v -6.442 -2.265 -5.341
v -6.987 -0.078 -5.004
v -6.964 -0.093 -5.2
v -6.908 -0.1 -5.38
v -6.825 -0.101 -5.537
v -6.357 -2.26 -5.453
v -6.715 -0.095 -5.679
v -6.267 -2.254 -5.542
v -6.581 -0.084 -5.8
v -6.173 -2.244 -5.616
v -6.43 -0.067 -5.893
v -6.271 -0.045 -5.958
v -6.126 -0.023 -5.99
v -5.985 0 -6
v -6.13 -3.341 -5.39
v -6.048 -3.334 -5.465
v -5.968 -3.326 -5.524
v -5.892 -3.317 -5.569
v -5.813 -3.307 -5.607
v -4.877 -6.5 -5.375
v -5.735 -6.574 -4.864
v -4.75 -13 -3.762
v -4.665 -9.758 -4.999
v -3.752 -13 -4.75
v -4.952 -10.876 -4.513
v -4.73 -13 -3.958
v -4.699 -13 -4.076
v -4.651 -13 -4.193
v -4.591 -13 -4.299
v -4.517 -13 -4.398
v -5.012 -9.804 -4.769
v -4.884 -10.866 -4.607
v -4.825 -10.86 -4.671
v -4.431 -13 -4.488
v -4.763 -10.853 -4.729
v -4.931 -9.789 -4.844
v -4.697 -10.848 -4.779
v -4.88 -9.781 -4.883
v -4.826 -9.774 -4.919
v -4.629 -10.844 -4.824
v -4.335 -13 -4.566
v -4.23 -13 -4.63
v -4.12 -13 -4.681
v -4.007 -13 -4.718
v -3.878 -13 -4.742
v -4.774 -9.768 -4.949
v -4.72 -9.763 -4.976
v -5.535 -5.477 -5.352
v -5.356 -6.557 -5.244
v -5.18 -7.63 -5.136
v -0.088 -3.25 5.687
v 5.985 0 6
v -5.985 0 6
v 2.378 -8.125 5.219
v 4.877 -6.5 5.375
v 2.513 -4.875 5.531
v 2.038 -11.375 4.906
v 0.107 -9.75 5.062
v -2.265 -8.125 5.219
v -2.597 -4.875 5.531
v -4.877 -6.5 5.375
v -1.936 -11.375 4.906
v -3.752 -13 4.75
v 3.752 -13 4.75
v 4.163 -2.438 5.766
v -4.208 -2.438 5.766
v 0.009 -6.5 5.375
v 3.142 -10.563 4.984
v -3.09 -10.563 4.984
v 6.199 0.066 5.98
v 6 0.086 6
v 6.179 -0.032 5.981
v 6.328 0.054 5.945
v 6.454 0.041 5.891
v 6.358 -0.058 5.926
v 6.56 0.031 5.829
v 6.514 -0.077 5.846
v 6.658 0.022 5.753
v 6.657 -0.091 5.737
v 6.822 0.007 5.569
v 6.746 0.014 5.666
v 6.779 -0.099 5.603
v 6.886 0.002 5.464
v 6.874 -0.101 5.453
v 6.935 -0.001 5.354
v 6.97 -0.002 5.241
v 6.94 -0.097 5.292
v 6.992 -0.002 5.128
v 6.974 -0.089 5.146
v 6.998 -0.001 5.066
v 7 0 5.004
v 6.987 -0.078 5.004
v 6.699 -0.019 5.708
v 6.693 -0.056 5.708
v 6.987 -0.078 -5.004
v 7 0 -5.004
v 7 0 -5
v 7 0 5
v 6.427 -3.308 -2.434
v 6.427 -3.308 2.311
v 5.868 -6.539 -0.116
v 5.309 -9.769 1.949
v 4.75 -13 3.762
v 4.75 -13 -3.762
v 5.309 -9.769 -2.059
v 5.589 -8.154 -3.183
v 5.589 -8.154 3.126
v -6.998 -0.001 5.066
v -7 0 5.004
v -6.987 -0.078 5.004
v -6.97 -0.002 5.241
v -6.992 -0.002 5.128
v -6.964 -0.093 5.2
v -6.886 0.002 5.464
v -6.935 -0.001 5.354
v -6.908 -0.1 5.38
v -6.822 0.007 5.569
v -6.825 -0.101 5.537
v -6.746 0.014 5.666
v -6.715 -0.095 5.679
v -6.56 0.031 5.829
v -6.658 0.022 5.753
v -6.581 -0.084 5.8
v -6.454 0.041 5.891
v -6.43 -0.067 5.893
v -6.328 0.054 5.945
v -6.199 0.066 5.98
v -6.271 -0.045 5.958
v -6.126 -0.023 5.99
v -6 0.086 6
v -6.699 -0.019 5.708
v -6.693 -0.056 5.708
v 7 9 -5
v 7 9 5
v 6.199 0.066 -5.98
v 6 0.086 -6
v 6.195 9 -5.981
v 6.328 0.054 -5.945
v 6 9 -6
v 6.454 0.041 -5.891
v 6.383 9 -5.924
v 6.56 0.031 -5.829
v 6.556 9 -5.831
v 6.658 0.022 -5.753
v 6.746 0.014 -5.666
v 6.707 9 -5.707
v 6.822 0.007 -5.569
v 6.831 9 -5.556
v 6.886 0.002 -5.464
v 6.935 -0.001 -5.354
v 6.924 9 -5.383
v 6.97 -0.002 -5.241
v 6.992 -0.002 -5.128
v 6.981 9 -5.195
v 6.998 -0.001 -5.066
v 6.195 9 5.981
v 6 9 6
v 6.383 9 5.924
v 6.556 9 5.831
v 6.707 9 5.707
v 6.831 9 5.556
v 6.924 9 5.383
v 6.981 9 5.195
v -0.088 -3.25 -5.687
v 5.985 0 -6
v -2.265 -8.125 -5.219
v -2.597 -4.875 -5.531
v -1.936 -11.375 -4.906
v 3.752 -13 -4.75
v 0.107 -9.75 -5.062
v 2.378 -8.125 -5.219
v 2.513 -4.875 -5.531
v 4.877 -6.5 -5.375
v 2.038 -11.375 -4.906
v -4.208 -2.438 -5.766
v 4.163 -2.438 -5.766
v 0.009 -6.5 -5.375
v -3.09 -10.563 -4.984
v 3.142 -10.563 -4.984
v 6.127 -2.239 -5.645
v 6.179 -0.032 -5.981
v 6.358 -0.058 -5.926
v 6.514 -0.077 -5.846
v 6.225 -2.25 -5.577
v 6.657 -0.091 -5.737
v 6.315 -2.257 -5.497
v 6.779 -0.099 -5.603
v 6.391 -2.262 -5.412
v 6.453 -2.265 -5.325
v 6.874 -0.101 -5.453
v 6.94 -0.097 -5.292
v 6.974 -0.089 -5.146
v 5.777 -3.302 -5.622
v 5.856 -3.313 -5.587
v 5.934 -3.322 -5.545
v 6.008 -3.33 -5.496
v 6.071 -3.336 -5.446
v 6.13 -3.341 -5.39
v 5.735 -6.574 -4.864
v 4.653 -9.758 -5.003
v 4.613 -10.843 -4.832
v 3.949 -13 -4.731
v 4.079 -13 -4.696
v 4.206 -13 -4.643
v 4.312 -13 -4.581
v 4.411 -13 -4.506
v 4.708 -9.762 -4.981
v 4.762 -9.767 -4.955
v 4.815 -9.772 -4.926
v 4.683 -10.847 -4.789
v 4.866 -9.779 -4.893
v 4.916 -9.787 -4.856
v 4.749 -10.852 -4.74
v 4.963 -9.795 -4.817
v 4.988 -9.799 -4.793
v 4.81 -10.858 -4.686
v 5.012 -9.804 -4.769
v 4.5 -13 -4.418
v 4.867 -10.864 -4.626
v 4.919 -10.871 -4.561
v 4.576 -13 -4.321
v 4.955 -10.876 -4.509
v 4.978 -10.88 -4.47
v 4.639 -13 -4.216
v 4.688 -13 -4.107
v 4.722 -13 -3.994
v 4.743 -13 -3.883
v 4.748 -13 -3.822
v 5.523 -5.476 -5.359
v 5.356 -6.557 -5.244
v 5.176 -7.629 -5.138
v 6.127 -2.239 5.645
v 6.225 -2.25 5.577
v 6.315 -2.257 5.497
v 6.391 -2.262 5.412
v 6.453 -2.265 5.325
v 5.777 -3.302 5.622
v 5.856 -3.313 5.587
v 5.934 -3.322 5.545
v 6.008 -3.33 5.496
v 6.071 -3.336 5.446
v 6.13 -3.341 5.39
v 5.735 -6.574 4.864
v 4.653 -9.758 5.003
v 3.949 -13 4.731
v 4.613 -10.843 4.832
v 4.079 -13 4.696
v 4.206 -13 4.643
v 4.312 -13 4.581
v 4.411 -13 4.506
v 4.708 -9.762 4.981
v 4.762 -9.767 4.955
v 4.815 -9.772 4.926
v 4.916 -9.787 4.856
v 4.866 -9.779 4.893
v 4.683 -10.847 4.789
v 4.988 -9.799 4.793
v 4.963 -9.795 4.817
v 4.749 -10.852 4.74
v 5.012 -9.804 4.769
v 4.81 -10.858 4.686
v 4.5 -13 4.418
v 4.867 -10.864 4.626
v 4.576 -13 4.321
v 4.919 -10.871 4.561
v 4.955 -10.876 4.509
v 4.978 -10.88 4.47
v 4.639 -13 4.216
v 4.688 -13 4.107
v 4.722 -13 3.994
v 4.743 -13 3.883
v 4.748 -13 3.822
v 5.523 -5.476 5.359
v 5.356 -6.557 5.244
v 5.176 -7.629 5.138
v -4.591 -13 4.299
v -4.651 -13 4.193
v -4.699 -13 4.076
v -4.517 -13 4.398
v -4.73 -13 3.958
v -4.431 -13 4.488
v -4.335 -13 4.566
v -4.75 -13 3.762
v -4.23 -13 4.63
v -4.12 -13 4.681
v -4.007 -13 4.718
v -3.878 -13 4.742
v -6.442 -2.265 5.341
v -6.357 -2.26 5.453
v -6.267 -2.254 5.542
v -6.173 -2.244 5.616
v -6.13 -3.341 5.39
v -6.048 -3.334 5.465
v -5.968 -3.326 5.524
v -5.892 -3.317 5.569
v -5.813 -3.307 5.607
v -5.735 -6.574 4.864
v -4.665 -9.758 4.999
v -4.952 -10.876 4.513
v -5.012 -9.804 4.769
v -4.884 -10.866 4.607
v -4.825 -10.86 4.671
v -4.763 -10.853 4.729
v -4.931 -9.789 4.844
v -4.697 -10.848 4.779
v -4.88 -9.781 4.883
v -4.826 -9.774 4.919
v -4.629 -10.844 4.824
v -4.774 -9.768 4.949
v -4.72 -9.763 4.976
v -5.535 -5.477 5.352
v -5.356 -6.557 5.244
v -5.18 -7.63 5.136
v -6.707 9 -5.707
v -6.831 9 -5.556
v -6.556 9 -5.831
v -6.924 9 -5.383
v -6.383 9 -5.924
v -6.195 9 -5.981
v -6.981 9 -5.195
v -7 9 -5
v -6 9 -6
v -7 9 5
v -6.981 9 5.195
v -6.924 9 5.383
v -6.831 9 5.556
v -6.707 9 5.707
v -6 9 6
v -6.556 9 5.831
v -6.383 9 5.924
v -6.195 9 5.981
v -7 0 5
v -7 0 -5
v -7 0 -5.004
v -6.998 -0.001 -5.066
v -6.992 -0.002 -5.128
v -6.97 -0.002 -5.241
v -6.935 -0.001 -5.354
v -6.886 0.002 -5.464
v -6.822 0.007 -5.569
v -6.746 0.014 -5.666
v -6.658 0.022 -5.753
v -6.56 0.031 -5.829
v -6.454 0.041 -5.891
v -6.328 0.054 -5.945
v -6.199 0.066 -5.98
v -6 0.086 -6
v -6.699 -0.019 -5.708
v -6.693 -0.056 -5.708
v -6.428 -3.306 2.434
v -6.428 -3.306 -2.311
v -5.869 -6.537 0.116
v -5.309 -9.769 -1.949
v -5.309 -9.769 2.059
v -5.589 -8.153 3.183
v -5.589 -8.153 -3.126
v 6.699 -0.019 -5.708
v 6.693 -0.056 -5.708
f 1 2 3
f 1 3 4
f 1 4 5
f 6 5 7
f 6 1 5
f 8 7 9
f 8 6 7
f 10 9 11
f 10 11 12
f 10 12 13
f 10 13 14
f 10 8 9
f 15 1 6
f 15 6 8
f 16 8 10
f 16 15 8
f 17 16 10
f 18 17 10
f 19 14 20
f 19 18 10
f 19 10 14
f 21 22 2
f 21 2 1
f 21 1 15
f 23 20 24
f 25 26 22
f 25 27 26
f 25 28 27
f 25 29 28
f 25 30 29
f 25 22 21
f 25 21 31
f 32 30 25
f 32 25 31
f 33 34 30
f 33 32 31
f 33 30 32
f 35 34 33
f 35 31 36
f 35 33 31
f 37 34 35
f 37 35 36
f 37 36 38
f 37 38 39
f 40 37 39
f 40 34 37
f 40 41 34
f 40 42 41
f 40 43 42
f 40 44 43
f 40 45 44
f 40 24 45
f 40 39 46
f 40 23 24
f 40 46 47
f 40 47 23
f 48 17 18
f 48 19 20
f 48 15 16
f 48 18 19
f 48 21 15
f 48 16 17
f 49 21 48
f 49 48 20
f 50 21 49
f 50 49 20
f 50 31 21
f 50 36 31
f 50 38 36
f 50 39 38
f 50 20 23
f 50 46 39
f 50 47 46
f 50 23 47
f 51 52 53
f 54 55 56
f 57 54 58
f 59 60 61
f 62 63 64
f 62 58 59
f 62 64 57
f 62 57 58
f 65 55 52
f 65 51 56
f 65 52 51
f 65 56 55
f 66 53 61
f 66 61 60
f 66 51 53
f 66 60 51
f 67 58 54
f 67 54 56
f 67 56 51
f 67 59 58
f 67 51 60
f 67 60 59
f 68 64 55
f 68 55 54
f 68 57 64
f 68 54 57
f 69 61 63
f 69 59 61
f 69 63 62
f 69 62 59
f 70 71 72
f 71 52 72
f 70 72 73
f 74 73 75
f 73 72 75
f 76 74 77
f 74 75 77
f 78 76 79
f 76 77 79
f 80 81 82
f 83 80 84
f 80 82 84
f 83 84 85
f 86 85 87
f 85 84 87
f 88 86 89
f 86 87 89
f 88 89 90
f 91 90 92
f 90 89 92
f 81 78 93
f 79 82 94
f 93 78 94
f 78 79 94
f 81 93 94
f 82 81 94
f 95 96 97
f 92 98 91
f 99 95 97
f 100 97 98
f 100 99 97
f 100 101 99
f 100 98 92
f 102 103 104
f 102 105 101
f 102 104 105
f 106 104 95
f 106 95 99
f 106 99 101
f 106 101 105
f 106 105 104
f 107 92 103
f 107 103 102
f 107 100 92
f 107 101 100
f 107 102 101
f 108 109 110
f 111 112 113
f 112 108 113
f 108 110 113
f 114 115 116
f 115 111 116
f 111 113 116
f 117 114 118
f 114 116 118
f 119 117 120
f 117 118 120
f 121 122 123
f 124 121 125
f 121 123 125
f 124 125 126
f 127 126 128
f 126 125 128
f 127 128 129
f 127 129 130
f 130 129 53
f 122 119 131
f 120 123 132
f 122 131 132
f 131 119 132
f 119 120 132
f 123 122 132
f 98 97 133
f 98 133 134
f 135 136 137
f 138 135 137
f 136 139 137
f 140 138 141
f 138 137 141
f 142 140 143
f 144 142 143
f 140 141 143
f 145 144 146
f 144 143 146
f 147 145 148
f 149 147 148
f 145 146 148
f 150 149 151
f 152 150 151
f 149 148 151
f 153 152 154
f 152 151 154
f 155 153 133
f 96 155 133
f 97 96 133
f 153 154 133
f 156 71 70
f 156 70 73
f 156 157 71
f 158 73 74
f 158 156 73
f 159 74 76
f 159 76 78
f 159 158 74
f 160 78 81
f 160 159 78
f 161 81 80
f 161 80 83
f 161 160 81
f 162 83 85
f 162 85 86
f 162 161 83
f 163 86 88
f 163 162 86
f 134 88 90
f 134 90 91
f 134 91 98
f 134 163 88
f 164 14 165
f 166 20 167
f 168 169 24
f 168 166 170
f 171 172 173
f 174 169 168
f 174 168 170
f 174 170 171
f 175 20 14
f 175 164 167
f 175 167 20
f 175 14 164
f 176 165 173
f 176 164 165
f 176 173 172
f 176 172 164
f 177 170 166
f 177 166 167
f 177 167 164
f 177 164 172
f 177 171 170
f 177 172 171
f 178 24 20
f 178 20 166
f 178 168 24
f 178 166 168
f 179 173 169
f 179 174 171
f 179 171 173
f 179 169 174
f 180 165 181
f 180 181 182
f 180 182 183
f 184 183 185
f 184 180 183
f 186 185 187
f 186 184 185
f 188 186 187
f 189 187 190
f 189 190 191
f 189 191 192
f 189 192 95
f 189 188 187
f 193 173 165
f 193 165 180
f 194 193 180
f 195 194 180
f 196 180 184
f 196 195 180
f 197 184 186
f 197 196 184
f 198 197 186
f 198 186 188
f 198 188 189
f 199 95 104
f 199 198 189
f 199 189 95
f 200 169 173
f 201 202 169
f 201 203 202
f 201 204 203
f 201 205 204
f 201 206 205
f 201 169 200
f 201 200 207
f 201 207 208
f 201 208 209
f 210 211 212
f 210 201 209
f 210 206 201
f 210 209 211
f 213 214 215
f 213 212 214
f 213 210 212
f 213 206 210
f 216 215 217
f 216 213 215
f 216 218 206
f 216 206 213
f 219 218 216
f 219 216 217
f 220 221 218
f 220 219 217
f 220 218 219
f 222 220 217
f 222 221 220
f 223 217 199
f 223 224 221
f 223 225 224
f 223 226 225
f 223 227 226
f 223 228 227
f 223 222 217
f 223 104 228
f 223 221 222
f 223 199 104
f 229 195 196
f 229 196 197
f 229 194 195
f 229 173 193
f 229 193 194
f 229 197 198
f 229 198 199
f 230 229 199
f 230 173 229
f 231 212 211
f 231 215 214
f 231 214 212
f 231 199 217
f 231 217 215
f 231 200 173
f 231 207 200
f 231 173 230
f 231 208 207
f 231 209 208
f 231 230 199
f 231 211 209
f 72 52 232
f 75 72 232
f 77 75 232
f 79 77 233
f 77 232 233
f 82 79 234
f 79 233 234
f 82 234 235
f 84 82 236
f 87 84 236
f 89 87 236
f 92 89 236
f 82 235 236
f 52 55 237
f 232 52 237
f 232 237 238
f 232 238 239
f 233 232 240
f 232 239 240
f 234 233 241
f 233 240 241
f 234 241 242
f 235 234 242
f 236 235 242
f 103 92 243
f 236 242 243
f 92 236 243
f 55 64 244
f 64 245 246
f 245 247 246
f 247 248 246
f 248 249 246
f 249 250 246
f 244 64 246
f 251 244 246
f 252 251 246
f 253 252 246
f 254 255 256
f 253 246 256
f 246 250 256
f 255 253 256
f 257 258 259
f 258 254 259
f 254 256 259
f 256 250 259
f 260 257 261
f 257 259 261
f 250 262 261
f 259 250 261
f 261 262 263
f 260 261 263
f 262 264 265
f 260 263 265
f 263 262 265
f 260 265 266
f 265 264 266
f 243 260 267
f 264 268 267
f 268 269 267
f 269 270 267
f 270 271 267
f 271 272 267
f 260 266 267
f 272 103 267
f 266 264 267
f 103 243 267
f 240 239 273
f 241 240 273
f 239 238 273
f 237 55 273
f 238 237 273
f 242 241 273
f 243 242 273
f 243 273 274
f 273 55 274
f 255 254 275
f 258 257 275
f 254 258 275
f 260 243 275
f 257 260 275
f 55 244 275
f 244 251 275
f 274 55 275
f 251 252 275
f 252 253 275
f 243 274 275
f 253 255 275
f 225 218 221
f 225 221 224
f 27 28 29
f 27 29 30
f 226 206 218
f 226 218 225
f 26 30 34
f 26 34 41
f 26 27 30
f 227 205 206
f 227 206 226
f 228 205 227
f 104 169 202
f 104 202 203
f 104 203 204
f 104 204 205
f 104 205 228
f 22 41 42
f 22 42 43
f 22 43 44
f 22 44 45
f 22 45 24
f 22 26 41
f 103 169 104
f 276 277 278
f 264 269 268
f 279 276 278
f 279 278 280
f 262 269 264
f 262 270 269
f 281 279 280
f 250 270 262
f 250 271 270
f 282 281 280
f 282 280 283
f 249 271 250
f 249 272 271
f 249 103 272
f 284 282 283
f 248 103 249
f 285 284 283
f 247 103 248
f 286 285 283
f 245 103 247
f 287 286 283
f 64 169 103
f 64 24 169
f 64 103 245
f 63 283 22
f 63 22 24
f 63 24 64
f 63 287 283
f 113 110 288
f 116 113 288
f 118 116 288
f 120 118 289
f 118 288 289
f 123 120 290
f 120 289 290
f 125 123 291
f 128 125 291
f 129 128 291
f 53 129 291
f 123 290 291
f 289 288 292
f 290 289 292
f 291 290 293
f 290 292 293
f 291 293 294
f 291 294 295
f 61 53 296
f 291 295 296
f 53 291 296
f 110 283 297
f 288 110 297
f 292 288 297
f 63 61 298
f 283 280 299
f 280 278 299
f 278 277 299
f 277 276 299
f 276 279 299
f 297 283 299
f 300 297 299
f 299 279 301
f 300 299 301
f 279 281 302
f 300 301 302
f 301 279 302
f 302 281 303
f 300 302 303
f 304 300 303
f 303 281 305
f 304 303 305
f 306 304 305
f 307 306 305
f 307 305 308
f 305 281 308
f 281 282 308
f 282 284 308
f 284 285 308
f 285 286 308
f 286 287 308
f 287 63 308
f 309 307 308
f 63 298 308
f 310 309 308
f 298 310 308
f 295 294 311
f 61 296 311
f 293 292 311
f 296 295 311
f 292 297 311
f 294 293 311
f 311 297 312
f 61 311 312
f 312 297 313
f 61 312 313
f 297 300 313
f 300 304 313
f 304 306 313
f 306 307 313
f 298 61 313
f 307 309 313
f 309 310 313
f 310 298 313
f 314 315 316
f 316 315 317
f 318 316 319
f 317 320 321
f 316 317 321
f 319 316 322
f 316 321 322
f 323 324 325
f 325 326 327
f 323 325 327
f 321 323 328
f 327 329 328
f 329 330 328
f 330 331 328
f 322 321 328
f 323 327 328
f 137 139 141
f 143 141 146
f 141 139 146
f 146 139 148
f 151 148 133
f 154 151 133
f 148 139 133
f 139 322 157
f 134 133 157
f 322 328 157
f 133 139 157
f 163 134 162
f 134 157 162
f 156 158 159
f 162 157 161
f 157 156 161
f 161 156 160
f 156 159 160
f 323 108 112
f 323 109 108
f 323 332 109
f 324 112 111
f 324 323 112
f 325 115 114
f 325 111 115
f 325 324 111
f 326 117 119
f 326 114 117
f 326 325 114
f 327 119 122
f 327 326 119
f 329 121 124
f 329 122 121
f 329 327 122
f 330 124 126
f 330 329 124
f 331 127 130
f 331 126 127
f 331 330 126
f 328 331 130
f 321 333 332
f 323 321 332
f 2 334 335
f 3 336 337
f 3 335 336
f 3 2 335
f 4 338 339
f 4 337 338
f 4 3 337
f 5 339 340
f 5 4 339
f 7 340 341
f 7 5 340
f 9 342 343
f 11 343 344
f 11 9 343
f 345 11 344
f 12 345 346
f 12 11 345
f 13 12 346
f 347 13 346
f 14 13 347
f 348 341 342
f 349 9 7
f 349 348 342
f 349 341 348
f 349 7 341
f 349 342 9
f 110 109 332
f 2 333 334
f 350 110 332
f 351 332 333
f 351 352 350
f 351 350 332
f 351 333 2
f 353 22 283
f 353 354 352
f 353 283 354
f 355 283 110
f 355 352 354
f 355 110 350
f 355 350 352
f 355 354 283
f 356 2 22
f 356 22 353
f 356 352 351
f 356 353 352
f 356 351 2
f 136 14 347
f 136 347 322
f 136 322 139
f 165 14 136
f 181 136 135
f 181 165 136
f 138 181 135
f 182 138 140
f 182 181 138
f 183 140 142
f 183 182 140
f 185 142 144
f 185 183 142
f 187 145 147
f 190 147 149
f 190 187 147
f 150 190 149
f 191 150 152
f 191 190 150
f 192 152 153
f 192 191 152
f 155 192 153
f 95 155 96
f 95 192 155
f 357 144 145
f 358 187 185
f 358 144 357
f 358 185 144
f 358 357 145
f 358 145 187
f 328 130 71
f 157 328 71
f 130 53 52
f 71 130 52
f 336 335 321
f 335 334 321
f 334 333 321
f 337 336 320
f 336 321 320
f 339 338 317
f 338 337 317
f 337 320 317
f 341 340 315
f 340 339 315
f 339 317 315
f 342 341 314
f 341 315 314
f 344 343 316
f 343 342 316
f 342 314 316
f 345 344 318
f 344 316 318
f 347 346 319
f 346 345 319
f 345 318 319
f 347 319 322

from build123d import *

# Parameters (mm, degrees)
SKETCH047_W  = 14
SKETCH047_H  = 12
PAD042_DEPTH = 9
SKETCH046_W  = 14
SKETCH046_H  = 12
SKETCH048_W  = 9.5
SKETCH048_H  = 9.5
FILLET002_R  = 1


with BuildPart() as part:
    # Sketch047 → Pad042 (new body)
    with BuildSketch(Plane.XZ):
        Rectangle(SKETCH047_W, SKETCH047_H)
    extrude(amount=-PAD042_DEPTH)

    # Sketch046 (on Face5 of Pad042) → AdditiveLoft section 0
    with BuildSketch(Plane.XZ):
        Rectangle(SKETCH046_W, SKETCH046_H)
    # Sketch048 (on DatumPlane) → AdditiveLoft section 1
    with BuildSketch(Plane.XZ.offset(13)):
        Rectangle(SKETCH048_W, SKETCH048_H)
    loft()

    # Fillet002
    fillet002_edges = [part.edges().sort_by_distance(p)[0] for p in [
        (-7, 4.5, -6),
        (-5.875, -6.5, -5.375),
        (-5.875, -6.5, 5.375),
        (-7, 4.5, 6),
        (7, 4.5, -6),
        (5.875, -6.5, -5.375),
        (7, 4.5, 6),
        (5.875, -6.5, 5.375),
    ]]
    fillet(fillet002_edges, radius=FILLET002_R)


solid = part.part
